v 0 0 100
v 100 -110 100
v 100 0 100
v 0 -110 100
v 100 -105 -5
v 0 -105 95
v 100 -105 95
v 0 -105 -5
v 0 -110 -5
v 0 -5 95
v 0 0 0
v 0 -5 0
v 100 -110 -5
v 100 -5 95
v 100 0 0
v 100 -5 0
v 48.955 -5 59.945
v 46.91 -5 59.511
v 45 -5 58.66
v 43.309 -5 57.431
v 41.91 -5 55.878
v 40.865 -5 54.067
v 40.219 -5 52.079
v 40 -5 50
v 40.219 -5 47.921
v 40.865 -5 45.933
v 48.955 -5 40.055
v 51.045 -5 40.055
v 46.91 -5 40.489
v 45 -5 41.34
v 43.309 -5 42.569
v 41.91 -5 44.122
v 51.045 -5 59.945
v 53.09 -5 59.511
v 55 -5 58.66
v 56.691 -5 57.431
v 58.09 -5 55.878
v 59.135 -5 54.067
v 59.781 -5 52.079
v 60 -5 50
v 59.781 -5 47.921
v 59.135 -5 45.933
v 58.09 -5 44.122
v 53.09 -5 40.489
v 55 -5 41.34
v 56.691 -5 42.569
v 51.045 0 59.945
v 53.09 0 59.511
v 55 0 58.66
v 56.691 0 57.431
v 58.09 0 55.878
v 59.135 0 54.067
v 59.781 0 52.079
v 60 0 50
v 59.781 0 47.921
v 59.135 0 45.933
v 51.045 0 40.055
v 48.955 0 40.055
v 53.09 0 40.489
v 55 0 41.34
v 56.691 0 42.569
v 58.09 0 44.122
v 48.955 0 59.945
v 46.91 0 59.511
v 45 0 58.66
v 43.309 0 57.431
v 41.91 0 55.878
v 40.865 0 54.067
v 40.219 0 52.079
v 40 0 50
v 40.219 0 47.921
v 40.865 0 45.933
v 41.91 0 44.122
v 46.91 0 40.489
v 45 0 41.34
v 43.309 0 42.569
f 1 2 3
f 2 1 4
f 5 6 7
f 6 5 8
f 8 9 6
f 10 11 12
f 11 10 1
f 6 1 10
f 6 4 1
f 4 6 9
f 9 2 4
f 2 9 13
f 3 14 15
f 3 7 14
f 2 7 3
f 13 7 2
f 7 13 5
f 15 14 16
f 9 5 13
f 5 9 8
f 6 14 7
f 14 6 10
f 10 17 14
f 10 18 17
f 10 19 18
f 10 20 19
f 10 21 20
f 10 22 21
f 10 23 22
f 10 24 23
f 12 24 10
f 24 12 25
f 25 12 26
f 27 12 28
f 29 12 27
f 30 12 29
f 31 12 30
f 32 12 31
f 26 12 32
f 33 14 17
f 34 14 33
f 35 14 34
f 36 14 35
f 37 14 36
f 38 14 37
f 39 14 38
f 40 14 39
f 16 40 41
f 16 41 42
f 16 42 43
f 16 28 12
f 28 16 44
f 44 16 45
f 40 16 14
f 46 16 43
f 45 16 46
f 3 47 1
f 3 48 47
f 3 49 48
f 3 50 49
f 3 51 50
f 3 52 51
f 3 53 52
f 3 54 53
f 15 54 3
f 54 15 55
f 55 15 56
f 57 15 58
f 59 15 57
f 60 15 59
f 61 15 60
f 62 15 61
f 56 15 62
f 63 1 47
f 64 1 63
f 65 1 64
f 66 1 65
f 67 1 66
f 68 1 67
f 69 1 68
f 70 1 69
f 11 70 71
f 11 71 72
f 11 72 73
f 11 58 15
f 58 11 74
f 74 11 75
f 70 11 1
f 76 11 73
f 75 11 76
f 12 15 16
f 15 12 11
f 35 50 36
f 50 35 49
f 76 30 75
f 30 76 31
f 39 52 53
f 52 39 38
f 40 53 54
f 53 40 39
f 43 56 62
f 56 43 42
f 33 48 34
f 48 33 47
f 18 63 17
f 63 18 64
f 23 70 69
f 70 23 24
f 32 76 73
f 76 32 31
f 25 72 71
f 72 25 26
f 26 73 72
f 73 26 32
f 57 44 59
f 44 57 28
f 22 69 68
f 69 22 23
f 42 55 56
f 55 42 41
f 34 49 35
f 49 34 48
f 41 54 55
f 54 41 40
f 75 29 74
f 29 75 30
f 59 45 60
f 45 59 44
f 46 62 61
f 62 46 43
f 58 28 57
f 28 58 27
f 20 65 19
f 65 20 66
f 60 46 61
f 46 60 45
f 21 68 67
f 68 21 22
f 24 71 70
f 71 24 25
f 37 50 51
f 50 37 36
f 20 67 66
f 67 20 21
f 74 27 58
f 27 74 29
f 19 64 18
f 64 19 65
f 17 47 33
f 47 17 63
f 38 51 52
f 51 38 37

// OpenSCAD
// file: ../Library/GeneralIonHook.scad
BORDER_HEIGTH = 100;
LEDGE_HEIGHT = 100;

module GeneralIonHook(baseHeight, width, thickness)
{
    union()
    {
        translate([0, -(BORDER_HEIGTH+(thickness)), baseHeight-(LEDGE_HEIGHT+thickness)])
        rotate([90,0,0])
        linear_extrude(thickness)
        square([width, LEDGE_HEIGHT+thickness]);
        translate([0, -(BORDER_HEIGTH+(thickness)), baseHeight-thickness])
        linear_extrude(thickness)
        square([width, BORDER_HEIGTH]);
        rotate([90,0,0])
        linear_extrude(thickness)
        square([width, baseHeight]);
    }
}
// main file
include <../Library/GeneralIonHook.scad>

WIDTH = 100;
BASE_HEIGHT = 100;
HOLE_DIAMETER = 10;
HOLE_X_OFFSET = 50;
HOLE_HEIGHT = 50;
THICKNESS = 5;

difference()
{
    GeneralIonHook(BASE_HEIGHT, WIDTH, THICKNESS);
    translate([HOLE_X_OFFSET ,0, HOLE_HEIGHT])
    rotate([90, 0, 0])
    linear_extrude(THICKNESS)
    circle(HOLE_DIAMETER);
}
